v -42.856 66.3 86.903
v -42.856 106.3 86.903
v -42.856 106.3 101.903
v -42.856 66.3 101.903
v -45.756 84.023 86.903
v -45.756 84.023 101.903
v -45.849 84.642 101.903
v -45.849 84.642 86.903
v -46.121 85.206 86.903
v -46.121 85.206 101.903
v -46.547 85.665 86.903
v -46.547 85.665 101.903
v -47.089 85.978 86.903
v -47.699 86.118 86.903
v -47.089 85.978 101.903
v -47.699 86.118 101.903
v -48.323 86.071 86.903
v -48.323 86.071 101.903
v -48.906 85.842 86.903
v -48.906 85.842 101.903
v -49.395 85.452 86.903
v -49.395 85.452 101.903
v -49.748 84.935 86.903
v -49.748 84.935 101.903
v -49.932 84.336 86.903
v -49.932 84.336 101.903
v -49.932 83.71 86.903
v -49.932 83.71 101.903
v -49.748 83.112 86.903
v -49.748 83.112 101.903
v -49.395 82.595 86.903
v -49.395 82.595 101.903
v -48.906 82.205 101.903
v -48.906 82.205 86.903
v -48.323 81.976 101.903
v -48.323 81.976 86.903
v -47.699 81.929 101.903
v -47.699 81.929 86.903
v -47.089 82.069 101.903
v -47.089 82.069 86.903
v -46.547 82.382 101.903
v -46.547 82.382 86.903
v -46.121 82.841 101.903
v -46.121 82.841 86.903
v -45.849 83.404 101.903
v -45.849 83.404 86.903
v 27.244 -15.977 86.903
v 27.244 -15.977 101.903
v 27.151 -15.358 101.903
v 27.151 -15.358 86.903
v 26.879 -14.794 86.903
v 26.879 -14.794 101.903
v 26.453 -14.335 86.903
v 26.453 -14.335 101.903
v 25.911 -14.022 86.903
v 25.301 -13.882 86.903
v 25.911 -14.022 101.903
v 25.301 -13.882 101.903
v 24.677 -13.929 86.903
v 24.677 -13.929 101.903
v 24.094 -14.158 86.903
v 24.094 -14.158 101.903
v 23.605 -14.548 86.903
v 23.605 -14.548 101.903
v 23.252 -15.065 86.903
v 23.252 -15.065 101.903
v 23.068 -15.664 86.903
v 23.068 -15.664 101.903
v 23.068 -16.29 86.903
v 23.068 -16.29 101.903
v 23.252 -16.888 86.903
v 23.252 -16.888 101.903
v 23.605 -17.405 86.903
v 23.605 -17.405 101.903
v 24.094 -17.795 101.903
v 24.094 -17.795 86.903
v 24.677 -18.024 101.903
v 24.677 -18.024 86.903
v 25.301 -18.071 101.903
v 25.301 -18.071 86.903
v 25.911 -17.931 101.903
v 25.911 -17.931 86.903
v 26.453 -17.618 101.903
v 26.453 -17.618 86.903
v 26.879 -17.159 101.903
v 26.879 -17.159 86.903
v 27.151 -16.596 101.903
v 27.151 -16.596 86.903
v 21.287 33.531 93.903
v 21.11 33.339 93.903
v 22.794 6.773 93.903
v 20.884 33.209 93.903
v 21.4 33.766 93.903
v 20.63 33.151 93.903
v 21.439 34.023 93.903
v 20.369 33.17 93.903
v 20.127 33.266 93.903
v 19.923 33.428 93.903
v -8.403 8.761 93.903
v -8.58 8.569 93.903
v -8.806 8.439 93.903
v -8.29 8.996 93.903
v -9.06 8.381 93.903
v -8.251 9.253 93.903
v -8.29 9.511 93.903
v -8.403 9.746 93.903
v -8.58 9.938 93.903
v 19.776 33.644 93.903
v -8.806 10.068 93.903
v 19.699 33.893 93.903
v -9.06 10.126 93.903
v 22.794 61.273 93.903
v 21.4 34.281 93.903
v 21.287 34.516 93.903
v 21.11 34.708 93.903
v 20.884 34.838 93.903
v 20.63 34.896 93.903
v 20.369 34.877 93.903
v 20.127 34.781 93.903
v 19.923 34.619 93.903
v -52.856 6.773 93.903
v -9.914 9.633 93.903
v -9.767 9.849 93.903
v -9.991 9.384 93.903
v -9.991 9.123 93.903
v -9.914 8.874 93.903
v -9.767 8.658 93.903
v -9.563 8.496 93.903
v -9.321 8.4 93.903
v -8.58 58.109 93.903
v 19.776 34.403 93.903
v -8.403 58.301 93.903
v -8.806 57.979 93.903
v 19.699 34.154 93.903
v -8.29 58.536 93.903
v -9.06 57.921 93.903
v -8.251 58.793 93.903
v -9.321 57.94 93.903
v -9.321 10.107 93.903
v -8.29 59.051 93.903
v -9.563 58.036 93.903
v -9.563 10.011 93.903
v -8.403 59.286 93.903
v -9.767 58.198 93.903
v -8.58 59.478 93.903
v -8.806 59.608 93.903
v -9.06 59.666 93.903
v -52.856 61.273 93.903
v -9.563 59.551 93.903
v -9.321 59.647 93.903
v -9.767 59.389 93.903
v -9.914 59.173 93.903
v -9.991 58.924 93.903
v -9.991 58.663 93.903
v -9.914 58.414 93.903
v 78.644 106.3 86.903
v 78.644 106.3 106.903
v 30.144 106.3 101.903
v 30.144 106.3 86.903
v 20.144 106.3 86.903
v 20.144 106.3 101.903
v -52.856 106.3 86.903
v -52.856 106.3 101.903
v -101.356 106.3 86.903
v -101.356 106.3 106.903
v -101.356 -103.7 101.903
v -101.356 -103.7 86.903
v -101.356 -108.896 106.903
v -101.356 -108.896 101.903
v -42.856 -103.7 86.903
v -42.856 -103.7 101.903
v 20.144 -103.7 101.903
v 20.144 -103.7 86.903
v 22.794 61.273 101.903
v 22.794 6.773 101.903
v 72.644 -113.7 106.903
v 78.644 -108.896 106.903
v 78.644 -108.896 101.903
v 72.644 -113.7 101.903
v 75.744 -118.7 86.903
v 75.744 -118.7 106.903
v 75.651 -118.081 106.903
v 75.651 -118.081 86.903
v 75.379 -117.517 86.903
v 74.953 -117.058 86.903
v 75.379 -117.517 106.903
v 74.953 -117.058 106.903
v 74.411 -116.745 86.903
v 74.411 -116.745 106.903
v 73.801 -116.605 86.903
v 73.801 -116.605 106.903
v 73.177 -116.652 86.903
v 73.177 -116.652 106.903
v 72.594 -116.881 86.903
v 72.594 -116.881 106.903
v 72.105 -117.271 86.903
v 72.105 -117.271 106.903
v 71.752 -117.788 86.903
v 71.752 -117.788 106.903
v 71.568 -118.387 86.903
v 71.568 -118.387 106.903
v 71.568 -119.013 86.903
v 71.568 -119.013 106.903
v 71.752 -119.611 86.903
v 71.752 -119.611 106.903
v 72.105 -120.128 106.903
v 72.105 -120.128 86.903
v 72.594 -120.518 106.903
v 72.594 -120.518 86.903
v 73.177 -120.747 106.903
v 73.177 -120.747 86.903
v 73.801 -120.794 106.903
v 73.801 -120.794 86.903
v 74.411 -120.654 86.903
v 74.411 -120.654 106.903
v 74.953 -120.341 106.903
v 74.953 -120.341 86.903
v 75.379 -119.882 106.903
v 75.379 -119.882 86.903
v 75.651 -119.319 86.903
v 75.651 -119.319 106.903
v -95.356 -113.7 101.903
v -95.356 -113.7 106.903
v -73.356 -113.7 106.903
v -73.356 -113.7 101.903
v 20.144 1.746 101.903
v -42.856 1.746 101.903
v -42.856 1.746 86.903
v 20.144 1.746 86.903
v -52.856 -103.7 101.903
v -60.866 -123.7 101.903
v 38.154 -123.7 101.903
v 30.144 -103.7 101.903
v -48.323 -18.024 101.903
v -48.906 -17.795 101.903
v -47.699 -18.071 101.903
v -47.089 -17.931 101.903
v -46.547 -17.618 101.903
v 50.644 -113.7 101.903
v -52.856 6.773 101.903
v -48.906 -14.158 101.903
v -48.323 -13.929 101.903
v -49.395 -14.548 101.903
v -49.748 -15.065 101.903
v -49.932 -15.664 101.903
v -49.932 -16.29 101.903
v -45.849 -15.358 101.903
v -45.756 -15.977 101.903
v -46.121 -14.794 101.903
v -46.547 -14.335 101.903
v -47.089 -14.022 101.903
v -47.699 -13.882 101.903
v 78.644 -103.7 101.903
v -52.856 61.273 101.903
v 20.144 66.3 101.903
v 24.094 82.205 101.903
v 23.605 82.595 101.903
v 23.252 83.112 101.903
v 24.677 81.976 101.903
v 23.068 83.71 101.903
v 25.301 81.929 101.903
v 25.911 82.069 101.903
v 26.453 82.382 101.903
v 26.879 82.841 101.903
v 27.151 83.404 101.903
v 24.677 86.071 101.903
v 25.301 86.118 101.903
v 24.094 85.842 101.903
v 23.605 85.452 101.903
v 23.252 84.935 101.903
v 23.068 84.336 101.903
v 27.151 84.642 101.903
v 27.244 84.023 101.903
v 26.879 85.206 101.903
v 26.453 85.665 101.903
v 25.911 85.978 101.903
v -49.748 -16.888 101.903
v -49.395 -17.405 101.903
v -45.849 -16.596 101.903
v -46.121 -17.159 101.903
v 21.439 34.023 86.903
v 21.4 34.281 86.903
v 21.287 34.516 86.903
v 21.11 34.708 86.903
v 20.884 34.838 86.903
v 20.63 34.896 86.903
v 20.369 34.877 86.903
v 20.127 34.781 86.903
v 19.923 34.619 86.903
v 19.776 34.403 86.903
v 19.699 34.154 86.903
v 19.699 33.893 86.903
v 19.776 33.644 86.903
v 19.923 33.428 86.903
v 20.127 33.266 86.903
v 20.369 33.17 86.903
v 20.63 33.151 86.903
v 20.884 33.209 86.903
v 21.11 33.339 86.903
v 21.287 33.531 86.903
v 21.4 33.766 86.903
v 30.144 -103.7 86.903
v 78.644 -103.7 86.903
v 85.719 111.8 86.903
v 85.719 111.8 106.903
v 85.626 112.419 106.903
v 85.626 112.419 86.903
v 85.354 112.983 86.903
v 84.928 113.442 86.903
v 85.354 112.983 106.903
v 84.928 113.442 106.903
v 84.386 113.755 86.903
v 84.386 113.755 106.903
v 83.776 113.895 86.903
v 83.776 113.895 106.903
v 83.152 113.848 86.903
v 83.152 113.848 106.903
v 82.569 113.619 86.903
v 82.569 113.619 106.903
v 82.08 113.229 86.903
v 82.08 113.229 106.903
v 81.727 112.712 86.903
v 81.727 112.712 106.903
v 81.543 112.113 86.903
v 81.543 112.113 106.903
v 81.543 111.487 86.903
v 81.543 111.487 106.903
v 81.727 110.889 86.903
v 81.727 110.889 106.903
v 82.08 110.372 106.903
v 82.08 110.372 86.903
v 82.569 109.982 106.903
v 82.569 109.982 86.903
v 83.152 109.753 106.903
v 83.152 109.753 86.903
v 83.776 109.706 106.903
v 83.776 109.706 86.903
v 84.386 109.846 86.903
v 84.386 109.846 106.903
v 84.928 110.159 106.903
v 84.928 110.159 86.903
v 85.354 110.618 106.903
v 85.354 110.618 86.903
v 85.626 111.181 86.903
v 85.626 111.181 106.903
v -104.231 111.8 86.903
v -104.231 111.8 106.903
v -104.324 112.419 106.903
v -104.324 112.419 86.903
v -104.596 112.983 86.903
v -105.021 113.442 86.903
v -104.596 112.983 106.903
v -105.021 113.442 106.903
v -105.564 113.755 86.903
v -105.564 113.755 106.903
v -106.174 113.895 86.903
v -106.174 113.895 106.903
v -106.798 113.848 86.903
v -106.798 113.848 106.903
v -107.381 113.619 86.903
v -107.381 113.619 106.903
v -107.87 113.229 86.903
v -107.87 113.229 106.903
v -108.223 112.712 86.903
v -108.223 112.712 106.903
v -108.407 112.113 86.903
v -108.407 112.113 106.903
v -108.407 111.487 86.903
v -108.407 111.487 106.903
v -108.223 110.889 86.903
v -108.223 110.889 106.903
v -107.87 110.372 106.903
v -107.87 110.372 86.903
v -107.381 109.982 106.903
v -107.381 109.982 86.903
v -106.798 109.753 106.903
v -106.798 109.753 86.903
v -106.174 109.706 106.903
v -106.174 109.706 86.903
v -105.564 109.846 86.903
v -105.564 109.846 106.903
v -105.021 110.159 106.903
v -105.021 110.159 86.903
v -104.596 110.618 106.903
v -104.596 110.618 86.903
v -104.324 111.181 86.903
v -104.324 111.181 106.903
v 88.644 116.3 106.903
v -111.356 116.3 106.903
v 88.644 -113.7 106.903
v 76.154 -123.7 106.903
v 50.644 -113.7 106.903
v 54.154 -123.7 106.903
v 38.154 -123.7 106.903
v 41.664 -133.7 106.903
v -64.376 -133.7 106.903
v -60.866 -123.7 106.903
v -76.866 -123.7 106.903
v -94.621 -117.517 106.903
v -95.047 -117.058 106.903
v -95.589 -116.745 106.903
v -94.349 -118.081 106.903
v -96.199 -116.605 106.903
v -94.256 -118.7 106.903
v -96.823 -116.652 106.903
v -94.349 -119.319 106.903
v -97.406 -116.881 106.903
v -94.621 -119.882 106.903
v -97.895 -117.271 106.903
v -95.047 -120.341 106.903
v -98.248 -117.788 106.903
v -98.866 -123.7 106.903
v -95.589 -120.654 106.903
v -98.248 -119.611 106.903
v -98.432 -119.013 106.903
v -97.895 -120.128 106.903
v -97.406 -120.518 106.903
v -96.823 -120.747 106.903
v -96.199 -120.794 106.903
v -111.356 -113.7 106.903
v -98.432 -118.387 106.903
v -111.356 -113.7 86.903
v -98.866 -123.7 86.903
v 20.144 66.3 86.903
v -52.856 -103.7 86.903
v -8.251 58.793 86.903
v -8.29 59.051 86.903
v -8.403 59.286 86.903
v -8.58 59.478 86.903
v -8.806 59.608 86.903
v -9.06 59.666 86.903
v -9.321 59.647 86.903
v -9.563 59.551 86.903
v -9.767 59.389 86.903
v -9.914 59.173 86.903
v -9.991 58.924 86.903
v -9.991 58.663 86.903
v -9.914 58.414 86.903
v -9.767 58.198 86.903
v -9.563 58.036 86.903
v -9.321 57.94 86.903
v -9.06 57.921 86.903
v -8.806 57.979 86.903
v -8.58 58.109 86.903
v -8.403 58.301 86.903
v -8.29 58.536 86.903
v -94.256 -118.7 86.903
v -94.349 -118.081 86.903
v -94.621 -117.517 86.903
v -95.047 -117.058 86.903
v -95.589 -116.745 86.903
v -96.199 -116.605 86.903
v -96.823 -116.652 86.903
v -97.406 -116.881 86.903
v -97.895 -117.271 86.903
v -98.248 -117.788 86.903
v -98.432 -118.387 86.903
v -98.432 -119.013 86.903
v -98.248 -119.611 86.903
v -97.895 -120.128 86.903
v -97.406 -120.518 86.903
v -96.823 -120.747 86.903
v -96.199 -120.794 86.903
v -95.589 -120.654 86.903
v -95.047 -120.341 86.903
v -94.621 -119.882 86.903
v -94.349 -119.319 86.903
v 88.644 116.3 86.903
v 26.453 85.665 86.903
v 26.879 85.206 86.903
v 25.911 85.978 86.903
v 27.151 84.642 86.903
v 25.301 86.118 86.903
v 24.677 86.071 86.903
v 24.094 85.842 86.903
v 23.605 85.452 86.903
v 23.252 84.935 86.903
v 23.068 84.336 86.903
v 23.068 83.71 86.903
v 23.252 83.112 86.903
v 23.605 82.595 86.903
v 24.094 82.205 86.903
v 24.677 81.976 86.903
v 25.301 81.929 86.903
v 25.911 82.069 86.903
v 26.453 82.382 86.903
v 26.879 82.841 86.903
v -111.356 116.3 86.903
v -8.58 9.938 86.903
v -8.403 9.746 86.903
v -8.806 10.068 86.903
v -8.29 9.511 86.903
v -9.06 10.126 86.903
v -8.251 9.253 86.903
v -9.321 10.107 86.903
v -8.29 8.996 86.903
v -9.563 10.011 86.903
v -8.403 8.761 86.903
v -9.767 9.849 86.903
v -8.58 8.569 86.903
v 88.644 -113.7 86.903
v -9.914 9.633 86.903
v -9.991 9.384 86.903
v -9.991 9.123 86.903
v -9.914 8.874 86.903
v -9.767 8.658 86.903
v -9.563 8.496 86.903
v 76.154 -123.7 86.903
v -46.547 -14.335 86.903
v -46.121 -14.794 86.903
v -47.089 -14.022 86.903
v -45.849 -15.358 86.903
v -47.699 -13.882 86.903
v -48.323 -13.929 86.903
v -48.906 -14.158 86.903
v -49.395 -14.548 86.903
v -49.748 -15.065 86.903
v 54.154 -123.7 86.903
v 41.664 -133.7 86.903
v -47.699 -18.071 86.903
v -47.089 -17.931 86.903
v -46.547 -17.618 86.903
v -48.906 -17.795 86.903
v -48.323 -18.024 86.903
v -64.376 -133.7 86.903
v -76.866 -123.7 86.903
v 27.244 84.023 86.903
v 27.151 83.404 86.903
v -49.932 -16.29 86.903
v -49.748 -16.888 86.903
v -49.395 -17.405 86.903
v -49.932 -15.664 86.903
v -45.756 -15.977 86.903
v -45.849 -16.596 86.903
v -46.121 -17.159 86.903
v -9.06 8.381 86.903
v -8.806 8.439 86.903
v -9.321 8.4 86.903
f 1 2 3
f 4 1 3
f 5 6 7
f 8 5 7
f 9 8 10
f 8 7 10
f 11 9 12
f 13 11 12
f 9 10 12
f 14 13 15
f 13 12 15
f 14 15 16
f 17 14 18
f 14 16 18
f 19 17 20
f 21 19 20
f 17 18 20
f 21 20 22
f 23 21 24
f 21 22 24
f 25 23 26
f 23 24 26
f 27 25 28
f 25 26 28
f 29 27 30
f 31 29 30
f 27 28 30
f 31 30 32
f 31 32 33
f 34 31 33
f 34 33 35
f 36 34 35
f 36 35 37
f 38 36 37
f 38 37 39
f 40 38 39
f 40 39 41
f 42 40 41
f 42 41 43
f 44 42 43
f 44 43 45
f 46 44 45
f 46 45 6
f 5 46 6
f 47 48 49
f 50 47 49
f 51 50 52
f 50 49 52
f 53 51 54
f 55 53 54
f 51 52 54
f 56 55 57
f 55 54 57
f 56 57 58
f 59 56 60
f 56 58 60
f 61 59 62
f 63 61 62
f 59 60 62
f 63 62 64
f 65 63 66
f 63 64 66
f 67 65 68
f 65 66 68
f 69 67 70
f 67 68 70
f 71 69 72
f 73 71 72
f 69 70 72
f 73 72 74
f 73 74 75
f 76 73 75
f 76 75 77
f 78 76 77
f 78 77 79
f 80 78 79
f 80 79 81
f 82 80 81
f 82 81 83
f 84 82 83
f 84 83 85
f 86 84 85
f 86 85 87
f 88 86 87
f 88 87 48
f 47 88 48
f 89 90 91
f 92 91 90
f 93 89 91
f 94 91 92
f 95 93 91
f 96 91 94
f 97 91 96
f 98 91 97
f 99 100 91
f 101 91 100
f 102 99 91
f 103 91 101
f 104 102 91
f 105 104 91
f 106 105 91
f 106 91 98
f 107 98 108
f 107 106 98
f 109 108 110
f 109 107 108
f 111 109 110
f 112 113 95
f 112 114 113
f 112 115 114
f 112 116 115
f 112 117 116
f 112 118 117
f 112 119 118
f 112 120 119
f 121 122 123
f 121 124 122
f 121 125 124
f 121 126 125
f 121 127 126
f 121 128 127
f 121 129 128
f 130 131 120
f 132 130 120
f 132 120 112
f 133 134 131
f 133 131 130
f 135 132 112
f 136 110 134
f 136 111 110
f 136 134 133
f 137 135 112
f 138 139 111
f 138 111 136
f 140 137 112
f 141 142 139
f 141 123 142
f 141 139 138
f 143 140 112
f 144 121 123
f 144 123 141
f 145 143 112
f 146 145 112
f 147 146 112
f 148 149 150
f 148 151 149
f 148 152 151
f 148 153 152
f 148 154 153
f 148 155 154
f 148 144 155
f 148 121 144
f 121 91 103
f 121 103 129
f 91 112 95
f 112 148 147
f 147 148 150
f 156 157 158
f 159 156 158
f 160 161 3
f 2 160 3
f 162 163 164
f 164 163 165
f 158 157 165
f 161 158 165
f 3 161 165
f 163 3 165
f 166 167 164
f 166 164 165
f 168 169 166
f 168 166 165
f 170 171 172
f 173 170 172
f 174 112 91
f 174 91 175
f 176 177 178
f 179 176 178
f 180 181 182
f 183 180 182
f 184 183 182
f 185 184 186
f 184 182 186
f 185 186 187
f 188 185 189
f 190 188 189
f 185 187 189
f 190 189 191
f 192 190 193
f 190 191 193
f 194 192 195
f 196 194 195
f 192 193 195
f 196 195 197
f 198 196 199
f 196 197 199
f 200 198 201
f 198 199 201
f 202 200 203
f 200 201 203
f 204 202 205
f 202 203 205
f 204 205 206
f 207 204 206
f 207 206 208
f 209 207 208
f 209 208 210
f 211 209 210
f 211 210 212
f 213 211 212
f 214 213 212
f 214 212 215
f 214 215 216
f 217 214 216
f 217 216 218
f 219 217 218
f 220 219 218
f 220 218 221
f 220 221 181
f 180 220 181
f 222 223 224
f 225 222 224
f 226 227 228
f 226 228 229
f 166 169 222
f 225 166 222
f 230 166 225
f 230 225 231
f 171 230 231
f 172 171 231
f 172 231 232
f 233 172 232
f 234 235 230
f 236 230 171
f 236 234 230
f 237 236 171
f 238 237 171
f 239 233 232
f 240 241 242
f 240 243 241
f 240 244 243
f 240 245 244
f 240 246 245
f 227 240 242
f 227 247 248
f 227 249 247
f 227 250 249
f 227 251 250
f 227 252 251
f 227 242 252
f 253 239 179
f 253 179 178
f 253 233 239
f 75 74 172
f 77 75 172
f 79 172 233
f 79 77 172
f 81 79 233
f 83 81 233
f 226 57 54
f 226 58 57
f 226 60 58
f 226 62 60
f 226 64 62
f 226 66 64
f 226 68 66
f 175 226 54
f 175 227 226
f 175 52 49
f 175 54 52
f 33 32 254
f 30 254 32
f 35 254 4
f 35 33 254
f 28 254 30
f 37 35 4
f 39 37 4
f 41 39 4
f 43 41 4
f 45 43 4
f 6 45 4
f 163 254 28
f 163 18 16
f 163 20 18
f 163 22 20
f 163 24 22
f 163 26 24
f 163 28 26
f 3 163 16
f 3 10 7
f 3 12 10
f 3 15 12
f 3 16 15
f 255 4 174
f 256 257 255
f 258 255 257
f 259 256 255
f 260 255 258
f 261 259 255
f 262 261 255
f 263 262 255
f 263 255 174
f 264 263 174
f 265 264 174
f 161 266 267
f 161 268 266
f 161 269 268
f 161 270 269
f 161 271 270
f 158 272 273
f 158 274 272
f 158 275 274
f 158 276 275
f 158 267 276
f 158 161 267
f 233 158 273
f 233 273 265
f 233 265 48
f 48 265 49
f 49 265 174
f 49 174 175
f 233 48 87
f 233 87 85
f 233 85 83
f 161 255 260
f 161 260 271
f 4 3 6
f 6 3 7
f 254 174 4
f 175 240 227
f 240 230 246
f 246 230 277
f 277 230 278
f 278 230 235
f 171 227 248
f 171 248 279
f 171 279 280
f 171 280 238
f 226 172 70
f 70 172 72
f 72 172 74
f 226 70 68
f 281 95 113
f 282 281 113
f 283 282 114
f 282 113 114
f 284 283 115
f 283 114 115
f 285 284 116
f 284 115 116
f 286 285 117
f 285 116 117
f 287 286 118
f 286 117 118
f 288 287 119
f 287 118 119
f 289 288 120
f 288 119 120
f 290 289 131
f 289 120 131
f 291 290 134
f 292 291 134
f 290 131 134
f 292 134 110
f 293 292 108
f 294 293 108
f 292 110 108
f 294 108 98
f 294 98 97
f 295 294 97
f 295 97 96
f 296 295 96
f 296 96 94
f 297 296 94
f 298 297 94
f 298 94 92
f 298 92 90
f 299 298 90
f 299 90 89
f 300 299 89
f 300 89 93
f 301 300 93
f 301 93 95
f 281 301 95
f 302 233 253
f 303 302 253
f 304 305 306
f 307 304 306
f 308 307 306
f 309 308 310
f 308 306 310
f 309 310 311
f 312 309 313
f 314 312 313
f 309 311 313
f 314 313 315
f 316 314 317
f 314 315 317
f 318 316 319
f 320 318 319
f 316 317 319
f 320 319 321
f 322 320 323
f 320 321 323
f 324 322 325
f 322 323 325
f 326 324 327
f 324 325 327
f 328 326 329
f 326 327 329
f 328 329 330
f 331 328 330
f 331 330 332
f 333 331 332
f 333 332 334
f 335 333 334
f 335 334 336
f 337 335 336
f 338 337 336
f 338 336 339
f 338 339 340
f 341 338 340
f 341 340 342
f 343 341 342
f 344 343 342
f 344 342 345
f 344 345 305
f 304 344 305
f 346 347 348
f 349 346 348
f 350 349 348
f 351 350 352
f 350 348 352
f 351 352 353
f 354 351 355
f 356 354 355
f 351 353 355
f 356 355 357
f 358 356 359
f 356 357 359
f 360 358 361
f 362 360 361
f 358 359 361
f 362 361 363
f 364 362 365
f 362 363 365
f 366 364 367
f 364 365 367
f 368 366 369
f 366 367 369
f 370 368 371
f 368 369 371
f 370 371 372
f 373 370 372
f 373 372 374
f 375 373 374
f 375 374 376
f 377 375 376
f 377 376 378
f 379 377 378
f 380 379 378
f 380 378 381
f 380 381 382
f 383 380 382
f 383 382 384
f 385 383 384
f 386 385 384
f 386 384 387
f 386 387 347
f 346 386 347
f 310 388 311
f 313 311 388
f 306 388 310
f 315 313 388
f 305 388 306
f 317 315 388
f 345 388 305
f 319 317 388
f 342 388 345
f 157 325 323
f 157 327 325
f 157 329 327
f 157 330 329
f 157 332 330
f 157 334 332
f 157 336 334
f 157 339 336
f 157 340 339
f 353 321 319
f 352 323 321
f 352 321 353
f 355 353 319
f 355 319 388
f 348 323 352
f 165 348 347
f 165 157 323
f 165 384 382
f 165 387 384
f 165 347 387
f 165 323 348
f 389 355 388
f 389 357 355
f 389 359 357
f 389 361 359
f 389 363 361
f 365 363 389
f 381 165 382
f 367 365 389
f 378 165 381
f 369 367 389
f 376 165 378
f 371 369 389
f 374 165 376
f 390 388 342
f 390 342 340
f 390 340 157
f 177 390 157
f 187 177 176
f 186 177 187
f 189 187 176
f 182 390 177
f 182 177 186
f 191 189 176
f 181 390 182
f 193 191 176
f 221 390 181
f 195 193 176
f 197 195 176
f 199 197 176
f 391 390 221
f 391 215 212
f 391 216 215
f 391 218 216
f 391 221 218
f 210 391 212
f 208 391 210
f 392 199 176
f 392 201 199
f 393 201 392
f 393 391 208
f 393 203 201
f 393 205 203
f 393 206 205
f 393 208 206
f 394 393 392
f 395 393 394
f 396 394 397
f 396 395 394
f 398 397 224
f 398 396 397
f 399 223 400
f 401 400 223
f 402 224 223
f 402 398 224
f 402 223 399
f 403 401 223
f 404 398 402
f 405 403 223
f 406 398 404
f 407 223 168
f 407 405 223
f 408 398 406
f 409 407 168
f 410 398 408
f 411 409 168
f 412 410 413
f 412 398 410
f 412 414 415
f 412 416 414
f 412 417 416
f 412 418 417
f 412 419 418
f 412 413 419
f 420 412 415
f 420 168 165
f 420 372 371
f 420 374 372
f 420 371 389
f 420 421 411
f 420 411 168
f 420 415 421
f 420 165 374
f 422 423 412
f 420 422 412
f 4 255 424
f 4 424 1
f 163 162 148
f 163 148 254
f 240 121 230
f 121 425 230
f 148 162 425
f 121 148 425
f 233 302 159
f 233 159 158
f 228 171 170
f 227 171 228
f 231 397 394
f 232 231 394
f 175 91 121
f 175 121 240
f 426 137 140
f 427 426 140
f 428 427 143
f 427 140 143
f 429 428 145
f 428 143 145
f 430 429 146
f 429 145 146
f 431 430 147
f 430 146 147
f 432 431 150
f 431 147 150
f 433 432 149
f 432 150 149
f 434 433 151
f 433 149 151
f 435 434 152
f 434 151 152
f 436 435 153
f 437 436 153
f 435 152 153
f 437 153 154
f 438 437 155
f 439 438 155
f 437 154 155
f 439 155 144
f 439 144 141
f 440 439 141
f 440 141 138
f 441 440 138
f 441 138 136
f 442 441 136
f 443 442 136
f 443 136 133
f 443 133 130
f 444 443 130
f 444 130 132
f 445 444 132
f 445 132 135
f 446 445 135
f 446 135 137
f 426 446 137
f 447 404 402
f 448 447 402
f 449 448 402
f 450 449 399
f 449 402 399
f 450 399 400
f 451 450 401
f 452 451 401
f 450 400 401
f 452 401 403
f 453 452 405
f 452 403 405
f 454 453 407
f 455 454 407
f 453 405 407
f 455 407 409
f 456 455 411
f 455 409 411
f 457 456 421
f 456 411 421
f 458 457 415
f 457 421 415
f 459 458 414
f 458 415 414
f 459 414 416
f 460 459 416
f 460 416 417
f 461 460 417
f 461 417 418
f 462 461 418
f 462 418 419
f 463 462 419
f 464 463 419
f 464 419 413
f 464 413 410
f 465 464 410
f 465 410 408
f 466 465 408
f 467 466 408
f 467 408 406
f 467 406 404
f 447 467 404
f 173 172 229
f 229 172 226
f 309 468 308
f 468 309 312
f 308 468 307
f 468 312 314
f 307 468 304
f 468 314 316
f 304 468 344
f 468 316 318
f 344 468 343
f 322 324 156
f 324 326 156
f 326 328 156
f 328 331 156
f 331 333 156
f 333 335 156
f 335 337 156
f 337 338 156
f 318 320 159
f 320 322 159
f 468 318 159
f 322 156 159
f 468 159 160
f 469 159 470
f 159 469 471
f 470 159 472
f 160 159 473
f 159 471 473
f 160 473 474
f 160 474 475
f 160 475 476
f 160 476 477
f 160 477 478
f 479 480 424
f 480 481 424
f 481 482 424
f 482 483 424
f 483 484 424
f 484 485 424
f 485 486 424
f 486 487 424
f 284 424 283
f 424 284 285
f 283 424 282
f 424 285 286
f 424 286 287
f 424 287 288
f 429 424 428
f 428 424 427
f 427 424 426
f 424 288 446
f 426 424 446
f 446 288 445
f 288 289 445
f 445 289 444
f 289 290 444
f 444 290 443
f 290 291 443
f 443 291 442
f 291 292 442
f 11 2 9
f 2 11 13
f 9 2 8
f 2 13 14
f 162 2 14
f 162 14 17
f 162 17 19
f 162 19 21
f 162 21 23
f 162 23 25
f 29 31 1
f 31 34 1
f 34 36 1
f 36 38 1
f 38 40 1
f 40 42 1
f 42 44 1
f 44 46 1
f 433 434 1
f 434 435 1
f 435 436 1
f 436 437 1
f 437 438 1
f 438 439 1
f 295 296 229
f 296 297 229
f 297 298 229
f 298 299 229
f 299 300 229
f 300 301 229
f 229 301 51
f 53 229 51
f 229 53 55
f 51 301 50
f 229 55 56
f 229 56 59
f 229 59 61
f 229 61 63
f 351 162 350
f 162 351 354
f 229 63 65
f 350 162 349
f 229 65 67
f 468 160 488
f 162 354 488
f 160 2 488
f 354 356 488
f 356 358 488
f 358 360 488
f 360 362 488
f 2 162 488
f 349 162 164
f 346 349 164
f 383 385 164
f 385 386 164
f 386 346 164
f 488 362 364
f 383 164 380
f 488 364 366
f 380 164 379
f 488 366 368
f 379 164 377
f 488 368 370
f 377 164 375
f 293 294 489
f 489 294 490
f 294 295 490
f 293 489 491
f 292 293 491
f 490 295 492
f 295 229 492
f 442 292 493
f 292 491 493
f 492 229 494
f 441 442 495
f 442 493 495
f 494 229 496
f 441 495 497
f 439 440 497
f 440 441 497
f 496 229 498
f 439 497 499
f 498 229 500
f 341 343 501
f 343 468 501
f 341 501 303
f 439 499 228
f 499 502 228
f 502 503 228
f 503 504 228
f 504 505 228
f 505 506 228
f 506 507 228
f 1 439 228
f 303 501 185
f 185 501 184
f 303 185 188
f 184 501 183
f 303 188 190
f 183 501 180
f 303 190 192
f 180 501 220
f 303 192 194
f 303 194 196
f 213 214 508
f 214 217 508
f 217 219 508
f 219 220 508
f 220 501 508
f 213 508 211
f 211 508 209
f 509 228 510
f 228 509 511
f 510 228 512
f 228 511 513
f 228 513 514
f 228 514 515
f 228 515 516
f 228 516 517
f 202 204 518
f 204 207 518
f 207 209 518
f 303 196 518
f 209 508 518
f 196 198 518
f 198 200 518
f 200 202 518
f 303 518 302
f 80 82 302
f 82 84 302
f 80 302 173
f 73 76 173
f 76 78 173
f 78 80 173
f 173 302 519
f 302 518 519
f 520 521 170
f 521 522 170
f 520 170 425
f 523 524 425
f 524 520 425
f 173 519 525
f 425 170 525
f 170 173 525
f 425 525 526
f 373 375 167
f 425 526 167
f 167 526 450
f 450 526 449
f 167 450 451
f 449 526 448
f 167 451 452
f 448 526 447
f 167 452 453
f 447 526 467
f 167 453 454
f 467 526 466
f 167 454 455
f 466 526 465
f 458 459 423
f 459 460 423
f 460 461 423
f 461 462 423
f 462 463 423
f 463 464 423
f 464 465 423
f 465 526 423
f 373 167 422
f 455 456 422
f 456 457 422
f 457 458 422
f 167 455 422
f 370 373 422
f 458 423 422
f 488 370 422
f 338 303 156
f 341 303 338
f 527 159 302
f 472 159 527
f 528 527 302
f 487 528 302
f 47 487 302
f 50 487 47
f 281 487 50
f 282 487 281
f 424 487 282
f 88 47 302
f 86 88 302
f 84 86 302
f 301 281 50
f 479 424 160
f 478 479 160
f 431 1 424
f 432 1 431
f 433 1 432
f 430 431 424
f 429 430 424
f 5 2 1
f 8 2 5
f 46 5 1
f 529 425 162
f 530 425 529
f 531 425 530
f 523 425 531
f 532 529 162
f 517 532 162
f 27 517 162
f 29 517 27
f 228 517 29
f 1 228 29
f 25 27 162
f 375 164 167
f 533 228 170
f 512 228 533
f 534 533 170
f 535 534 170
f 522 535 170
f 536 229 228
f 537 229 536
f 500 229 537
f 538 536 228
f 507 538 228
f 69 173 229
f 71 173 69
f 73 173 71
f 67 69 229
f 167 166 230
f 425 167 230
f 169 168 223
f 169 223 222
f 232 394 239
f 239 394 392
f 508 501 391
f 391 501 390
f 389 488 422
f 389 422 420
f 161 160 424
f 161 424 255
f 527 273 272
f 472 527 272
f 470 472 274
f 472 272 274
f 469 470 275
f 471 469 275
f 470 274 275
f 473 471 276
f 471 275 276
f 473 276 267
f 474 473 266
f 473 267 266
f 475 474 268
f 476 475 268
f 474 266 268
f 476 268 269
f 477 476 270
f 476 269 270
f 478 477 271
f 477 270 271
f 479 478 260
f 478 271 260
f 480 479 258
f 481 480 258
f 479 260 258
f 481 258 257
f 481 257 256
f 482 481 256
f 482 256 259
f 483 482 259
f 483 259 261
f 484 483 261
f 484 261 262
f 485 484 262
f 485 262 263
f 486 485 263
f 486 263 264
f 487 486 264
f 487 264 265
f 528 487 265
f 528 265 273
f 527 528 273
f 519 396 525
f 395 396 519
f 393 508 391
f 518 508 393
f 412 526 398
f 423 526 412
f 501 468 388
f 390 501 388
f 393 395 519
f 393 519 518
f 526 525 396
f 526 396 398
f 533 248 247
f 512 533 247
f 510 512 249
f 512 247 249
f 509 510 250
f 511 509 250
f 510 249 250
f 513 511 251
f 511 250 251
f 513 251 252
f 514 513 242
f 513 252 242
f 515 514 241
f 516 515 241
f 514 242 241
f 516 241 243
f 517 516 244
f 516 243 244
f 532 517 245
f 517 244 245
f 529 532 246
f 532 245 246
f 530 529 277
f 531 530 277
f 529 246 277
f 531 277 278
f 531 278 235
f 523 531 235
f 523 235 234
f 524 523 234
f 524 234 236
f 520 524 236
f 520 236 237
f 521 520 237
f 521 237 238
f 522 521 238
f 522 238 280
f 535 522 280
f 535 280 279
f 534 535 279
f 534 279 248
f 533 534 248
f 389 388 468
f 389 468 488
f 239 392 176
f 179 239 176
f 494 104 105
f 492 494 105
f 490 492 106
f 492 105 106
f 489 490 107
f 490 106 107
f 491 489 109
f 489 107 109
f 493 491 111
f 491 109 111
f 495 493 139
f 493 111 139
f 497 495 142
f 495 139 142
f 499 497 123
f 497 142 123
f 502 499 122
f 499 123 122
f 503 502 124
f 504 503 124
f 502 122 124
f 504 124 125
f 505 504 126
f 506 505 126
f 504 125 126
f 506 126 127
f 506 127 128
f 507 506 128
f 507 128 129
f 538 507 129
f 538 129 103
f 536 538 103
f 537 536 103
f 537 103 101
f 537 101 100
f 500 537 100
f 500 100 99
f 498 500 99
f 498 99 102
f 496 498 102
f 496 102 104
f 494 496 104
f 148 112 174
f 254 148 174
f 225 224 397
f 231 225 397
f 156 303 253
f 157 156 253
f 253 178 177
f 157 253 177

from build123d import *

# Parameters (mm, degrees)
ESQUISSE1_W                           = 200
ESQUISSE1_H                           = 30
BOSS_EXTRU_1_DEPTH                    = 20
ESQUISSE2_W                           = 83
ESQUISSE2_H                           = 20
BOSS_EXTRU_2_DEPTH                    = 170
ESQUISSE3_W                           = 10
ESQUISSE3_H                           = 20
BOSS_EXTRU_3_DEPTH                    = 40
ESQUISSE4_W                           = 10
ESQUISSE4_H                           = 20
BOSS_EXTRU_4_DEPTH                    = 40
ESQUISSE5_W                           = 10
ESQUISSE5_H                           = 20
BOSS_EXTRU_5_DEPTH                    = 210
ESQUISSE6_W                           = 10
ESQUISSE6_H                           = 20
BOSS_EXTRU_6_DEPTH                    = 210
ENL_V_MAT_EXTRU_1_DEPTH               = 5
ESQUISSE8_W                           = 200
ESQUISSE8_H                           = 20
BOSS_EXTRU_7_DEPTH                    = 10
ESQUISSE9_W                           = 46.979991994
ESQUISSE9_H                           = 10
ENL_V_MAT_EXTRU_2_DEPTH               = 176.144775689
ESQUISSE10_W                          = 46.979991993
ESQUISSE10_H                          = 10
ENL_V_MAT_EXTRU_3_DEPTH               = 176.144775689
ESQUISSE11_W                          = 63
ESQUISSE11_H                          = 105.446
ENL_V_MAT_EXTRU_4_DEPTH               = 175.644474436
ESQUISSE12_W                          = 8
ESQUISSE12_H                          = 54.5
ENL_V_MAT_EXTRU_5_DEPTH               = 75.65
D_POUILLE1_ANGLE                      = 51.317812547
D_POUILLE2_ANGLE                      = 51.317812547
DIAM_TRE_DU_PER_AGE_4_2_4_2_1_D       = 4.2
DIAM_TRE_DU_PER_AGE_4_2_4_2_2_D       = 4.2
DIAM_TRE_DU_PER_AGE_4_2_4_2_2_DEPTH   = 20
DIAM_TRE_DU_PER_AGE_1_75_1_75_1_D     = 1.75
DIAM_TRE_DU_PER_AGE_1_75_1_75_1_DEPTH = 20
CHANFREIN1_SIZE                       = 12.489995997
CHANFREIN1_SIZE2                      = 10
CHANFREIN2_SIZE                       = 10
CHANFREIN2_SIZE2                      = 12.489995997
CHANFREIN3_SIZE                       = 4.803844614
CHANFREIN3_SIZE2                      = 6
CHANFREIN4_SIZE                       = 6
CHANFREIN4_SIZE2                      = 4.803844614


with BuildPart() as part:
    # Esquisse1 → Boss.-Extru.1 (new body)
    with BuildSketch(Plane.XY.offset(106.902665531)):
        with Locations((-11.355880004, -118.699515481)):
            Rectangle(ESQUISSE1_W, ESQUISSE1_H)
    extrude(amount=-BOSS_EXTRU_1_DEPTH)

    # Esquisse2 → Boss.-Extru.2 (add)
    with BuildSketch(Plane(origin=(0, -103.699515481, 0), x_dir=(-1, 0, 0), z_dir=(0, 1, 0))):
        with Locations((11.355880004, 96.902665531)):
            Rectangle(ESQUISSE2_W, ESQUISSE2_H)
    extrude(amount=BOSS_EXTRU_2_DEPTH)

    # Esquisse3 → Boss.-Extru.3 (add)
    with BuildSketch(Plane(origin=(0, 66.300484519, 0), x_dir=(-1, 0, 0), z_dir=(0, 1, 0))):
        with Locations((-25.144119996, 96.902665531)):
            Rectangle(ESQUISSE3_W, ESQUISSE3_H)
    extrude(amount=BOSS_EXTRU_3_DEPTH)

    # Esquisse4 → Boss.-Extru.4 (add)
    with BuildSketch(Plane(origin=(0, 66.300484519, 0), x_dir=(-1, 0, 0), z_dir=(0, 1, 0))):
        with Locations((47.855880004, 96.902665531)):
            Rectangle(ESQUISSE4_W, ESQUISSE4_H)
    extrude(amount=BOSS_EXTRU_4_DEPTH)

    # Esquisse5 → Boss.-Extru.5 (add)
    with BuildSketch(Plane(origin=(0, -103.699515481, 0), x_dir=(-1, 0, 0), z_dir=(0, 1, 0))):
        with Locations((-83.644119996, 96.902665531)):
            Rectangle(ESQUISSE5_W, ESQUISSE5_H)
    extrude(amount=BOSS_EXTRU_5_DEPTH)

    # Esquisse6 → Boss.-Extru.6 (add)
    with BuildSketch(Plane(origin=(0, -103.699515481, 0), x_dir=(-1, 0, 0), z_dir=(0, 1, 0))):
        with Locations((106.355880004, 96.902665531)):
            Rectangle(ESQUISSE6_W, ESQUISSE6_H)
    extrude(amount=BOSS_EXTRU_6_DEPTH)

    # Esquisse7 → Enlèv. mat.-Extru.1 (cut)
    with BuildSketch(Plane.XY.offset(106.902665531)):
        Polygon((-42.855880004, 106.300484519), (-52.855880004, 106.300484519), (-52.855880004, -103.699515481), (-101.355880004, -103.699515481), (-101.355880004, -113.699515481), (-60.865884007, -113.699515481), (-60.865884007, -123.699515481), (38.154124, -123.699515481), (38.154124, -113.699515481), (78.644119996, -113.699515481), (78.644119996, -103.699515481), (30.144119996, -103.699515481), (30.144119996, 106.300484519), (20.144119996, 106.300484519), (20.144119996, 66.300484519), (-42.855880004, 66.300484519), align=None)
    extrude(amount=-ENL_V_MAT_EXTRU_1_DEPTH, mode=Mode.SUBTRACT)

    # Esquisse8 → Boss.-Extru.7 (add)
    with BuildSketch(Plane(origin=(0, 106.300484519, 0), x_dir=(-1, 0, 0), z_dir=(0, 1, 0))):
        with Locations((11.355880004, 96.902665531)):
            Rectangle(ESQUISSE8_W, ESQUISSE8_H)
    extrude(amount=BOSS_EXTRU_7_DEPTH)

    # Esquisse9 → Enlèv. mat.-Extru.2 (cut, through all)
    with BuildSketch(Plane(origin=(0, 0, 86.902665531), x_dir=(-1, 0, 0), z_dir=(0, 0, -1))):
        with Locations((87.865884007, -128.699515481)):
            Rectangle(ESQUISSE9_W, ESQUISSE9_H)
    extrude(amount=-ENL_V_MAT_EXTRU_2_DEPTH, mode=Mode.SUBTRACT)

    # Esquisse10 → Enlèv. mat.-Extru.3 (cut, through all)
    with BuildSketch(Plane(origin=(0, 0, 86.902665531), x_dir=(-1, 0, 0), z_dir=(0, 0, -1))):
        with Locations((-65.154124, -128.699515481)):
            Rectangle(ESQUISSE10_W, ESQUISSE10_H)
    extrude(amount=-ENL_V_MAT_EXTRU_3_DEPTH, mode=Mode.SUBTRACT)

    # Esquisse11 → Enlèv. mat.-Extru.4 (cut, through all)
    with BuildSketch(Plane.XY.offset(101.902665531)):
        with Locations((-11.355880004, -50.976515481)):
            Rectangle(ESQUISSE11_W, ESQUISSE11_H)
    extrude(amount=-ENL_V_MAT_EXTRU_4_DEPTH, mode=Mode.SUBTRACT)

    # Esquisse12 → Enlèv. mat.-Extru.5 (cut)
    with BuildSketch(Plane.ZY.offset(52.855880004)):
        with Locations((97.902665531, 34.023484519)):
            Rectangle(ESQUISSE12_W, ESQUISSE12_H)
    extrude(amount=-ENL_V_MAT_EXTRU_5_DEPTH, mode=Mode.SUBTRACT)

    # Dépouille1
    d_pouille1_faces = [part.faces().sort_by_distance(p)[0] for p in [
        (38.154124, -118.699515481, 104.402665531),
        (-60.865884007, -118.699515481, 104.402665531),
    ]]
    draft(d_pouille1_faces, Plane(origin=(-60.865884007, -123.699515481, 101.902665531), x_dir=(0, 0, 1), z_dir=(0, 1, 0)), D_POUILLE1_ANGLE)

    # Dépouille2
    d_pouille2_faces = [part.faces().sort_by_distance(p)[0] for p in [
        (41.664128003, -128.699515481, 96.902665531),
        (-64.37588801, -128.699515481, 96.902665531),
    ]]
    draft(d_pouille2_faces, Plane(origin=(-111.355880004, -133.699515481, 86.902665531), x_dir=(-1, 0, 0), z_dir=(0, -1, 0)), D_POUILLE2_ANGLE)

    # Diamètre du perçage Ø4.2 (4.2)1 (through all)
    with Locations(Plane(origin=(0, 0, 86.902665531), x_dir=(-1, 0, 0), z_dir=(0, 0, -1))):
        with Locations((-73.644119996, -118.699515481), (96.355880004, -118.699515481), (106.330817189, 111.800484519), (-83.619057182, 111.800484519)):
            Hole(DIAM_TRE_DU_PER_AGE_4_2_4_2_1_D / 2)

    # Diamètre du perçage Ø4.2 (4.2)2
    with Locations(Plane(origin=(0, 0, 86.902665531), x_dir=(-1, 0, 0), z_dir=(0, 0, -1))):
        with Locations((47.855880004, -15.976515481), (-25.144119996, -15.976515481), (-25.144119996, 84.023484519), (47.855880004, 84.023484519)):
            Hole(DIAM_TRE_DU_PER_AGE_4_2_4_2_2_D / 2, depth=DIAM_TRE_DU_PER_AGE_4_2_4_2_2_DEPTH)

    # Diamètre du perçage Ø1.75 (1.75)1
    with Locations(Plane(origin=(0, 0, 86.902665531), x_dir=(-1, 0, 0), z_dir=(0, 0, -1))):
        with Locations((9.125880004, 9.253484519), (-20.564119996, 34.023484519), (9.125880004, 58.793484519)):
            Hole(DIAM_TRE_DU_PER_AGE_1_75_1_75_1_D / 2, depth=DIAM_TRE_DU_PER_AGE_1_75_1_75_1_DEPTH)

    # Chanfrein1
    chanfrein1_edges = [part.edges().sort_by_distance(p)[0] for p in [
        (88.644119996, -123.699515481, 96.902665531),
    ]]
    chanfrein1_side = [part.faces().sort_by_distance(p)[0] for p in [
        (71.399121998, -123.699515481, 96.902665531),
    ]]
    chamfer(chanfrein1_edges, length=CHANFREIN1_SIZE, length2=CHANFREIN1_SIZE2, reference=chanfrein1_side[0])

    # Chanfrein2
    chanfrein2_edges = [part.edges().sort_by_distance(p)[0] for p in [
        (-111.355880004, -123.699515481, 96.902665531),
    ]]
    chanfrein2_side = [part.faces().sort_by_distance(p)[0] for p in [
        (-111.355880004, -3.699515481, 96.902665531),
    ]]
    chamfer(chanfrein2_edges, length=CHANFREIN2_SIZE, length2=CHANFREIN2_SIZE2, reference=chanfrein2_side[0])

    # Chanfrein3
    chanfrein3_edges = [part.edges().sort_by_distance(p)[0] for p in [
        (-101.355880004, -113.699515481, 104.402665531),
    ]]
    chanfrein3_side = [part.faces().sort_by_distance(p)[0] for p in [
        (-101.355880004, 0.006366872, 96.990900825),
    ]]
    chamfer(chanfrein3_edges, length=CHANFREIN3_SIZE, length2=CHANFREIN3_SIZE2, reference=chanfrein3_side[0])

    # Chanfrein4
    chanfrein4_edges = [part.edges().sort_by_distance(p)[0] for p in [
        (78.644119996, -113.699515481, 104.402665531),
    ]]
    chanfrein4_side = [part.faces().sort_by_distance(p)[0] for p in [
        (64.644119996, -113.699515481, 104.402665531),
    ]]
    chamfer(chanfrein4_edges, length=CHANFREIN4_SIZE, length2=CHANFREIN4_SIZE2, reference=chanfrein4_side[0])


solid = part.part
